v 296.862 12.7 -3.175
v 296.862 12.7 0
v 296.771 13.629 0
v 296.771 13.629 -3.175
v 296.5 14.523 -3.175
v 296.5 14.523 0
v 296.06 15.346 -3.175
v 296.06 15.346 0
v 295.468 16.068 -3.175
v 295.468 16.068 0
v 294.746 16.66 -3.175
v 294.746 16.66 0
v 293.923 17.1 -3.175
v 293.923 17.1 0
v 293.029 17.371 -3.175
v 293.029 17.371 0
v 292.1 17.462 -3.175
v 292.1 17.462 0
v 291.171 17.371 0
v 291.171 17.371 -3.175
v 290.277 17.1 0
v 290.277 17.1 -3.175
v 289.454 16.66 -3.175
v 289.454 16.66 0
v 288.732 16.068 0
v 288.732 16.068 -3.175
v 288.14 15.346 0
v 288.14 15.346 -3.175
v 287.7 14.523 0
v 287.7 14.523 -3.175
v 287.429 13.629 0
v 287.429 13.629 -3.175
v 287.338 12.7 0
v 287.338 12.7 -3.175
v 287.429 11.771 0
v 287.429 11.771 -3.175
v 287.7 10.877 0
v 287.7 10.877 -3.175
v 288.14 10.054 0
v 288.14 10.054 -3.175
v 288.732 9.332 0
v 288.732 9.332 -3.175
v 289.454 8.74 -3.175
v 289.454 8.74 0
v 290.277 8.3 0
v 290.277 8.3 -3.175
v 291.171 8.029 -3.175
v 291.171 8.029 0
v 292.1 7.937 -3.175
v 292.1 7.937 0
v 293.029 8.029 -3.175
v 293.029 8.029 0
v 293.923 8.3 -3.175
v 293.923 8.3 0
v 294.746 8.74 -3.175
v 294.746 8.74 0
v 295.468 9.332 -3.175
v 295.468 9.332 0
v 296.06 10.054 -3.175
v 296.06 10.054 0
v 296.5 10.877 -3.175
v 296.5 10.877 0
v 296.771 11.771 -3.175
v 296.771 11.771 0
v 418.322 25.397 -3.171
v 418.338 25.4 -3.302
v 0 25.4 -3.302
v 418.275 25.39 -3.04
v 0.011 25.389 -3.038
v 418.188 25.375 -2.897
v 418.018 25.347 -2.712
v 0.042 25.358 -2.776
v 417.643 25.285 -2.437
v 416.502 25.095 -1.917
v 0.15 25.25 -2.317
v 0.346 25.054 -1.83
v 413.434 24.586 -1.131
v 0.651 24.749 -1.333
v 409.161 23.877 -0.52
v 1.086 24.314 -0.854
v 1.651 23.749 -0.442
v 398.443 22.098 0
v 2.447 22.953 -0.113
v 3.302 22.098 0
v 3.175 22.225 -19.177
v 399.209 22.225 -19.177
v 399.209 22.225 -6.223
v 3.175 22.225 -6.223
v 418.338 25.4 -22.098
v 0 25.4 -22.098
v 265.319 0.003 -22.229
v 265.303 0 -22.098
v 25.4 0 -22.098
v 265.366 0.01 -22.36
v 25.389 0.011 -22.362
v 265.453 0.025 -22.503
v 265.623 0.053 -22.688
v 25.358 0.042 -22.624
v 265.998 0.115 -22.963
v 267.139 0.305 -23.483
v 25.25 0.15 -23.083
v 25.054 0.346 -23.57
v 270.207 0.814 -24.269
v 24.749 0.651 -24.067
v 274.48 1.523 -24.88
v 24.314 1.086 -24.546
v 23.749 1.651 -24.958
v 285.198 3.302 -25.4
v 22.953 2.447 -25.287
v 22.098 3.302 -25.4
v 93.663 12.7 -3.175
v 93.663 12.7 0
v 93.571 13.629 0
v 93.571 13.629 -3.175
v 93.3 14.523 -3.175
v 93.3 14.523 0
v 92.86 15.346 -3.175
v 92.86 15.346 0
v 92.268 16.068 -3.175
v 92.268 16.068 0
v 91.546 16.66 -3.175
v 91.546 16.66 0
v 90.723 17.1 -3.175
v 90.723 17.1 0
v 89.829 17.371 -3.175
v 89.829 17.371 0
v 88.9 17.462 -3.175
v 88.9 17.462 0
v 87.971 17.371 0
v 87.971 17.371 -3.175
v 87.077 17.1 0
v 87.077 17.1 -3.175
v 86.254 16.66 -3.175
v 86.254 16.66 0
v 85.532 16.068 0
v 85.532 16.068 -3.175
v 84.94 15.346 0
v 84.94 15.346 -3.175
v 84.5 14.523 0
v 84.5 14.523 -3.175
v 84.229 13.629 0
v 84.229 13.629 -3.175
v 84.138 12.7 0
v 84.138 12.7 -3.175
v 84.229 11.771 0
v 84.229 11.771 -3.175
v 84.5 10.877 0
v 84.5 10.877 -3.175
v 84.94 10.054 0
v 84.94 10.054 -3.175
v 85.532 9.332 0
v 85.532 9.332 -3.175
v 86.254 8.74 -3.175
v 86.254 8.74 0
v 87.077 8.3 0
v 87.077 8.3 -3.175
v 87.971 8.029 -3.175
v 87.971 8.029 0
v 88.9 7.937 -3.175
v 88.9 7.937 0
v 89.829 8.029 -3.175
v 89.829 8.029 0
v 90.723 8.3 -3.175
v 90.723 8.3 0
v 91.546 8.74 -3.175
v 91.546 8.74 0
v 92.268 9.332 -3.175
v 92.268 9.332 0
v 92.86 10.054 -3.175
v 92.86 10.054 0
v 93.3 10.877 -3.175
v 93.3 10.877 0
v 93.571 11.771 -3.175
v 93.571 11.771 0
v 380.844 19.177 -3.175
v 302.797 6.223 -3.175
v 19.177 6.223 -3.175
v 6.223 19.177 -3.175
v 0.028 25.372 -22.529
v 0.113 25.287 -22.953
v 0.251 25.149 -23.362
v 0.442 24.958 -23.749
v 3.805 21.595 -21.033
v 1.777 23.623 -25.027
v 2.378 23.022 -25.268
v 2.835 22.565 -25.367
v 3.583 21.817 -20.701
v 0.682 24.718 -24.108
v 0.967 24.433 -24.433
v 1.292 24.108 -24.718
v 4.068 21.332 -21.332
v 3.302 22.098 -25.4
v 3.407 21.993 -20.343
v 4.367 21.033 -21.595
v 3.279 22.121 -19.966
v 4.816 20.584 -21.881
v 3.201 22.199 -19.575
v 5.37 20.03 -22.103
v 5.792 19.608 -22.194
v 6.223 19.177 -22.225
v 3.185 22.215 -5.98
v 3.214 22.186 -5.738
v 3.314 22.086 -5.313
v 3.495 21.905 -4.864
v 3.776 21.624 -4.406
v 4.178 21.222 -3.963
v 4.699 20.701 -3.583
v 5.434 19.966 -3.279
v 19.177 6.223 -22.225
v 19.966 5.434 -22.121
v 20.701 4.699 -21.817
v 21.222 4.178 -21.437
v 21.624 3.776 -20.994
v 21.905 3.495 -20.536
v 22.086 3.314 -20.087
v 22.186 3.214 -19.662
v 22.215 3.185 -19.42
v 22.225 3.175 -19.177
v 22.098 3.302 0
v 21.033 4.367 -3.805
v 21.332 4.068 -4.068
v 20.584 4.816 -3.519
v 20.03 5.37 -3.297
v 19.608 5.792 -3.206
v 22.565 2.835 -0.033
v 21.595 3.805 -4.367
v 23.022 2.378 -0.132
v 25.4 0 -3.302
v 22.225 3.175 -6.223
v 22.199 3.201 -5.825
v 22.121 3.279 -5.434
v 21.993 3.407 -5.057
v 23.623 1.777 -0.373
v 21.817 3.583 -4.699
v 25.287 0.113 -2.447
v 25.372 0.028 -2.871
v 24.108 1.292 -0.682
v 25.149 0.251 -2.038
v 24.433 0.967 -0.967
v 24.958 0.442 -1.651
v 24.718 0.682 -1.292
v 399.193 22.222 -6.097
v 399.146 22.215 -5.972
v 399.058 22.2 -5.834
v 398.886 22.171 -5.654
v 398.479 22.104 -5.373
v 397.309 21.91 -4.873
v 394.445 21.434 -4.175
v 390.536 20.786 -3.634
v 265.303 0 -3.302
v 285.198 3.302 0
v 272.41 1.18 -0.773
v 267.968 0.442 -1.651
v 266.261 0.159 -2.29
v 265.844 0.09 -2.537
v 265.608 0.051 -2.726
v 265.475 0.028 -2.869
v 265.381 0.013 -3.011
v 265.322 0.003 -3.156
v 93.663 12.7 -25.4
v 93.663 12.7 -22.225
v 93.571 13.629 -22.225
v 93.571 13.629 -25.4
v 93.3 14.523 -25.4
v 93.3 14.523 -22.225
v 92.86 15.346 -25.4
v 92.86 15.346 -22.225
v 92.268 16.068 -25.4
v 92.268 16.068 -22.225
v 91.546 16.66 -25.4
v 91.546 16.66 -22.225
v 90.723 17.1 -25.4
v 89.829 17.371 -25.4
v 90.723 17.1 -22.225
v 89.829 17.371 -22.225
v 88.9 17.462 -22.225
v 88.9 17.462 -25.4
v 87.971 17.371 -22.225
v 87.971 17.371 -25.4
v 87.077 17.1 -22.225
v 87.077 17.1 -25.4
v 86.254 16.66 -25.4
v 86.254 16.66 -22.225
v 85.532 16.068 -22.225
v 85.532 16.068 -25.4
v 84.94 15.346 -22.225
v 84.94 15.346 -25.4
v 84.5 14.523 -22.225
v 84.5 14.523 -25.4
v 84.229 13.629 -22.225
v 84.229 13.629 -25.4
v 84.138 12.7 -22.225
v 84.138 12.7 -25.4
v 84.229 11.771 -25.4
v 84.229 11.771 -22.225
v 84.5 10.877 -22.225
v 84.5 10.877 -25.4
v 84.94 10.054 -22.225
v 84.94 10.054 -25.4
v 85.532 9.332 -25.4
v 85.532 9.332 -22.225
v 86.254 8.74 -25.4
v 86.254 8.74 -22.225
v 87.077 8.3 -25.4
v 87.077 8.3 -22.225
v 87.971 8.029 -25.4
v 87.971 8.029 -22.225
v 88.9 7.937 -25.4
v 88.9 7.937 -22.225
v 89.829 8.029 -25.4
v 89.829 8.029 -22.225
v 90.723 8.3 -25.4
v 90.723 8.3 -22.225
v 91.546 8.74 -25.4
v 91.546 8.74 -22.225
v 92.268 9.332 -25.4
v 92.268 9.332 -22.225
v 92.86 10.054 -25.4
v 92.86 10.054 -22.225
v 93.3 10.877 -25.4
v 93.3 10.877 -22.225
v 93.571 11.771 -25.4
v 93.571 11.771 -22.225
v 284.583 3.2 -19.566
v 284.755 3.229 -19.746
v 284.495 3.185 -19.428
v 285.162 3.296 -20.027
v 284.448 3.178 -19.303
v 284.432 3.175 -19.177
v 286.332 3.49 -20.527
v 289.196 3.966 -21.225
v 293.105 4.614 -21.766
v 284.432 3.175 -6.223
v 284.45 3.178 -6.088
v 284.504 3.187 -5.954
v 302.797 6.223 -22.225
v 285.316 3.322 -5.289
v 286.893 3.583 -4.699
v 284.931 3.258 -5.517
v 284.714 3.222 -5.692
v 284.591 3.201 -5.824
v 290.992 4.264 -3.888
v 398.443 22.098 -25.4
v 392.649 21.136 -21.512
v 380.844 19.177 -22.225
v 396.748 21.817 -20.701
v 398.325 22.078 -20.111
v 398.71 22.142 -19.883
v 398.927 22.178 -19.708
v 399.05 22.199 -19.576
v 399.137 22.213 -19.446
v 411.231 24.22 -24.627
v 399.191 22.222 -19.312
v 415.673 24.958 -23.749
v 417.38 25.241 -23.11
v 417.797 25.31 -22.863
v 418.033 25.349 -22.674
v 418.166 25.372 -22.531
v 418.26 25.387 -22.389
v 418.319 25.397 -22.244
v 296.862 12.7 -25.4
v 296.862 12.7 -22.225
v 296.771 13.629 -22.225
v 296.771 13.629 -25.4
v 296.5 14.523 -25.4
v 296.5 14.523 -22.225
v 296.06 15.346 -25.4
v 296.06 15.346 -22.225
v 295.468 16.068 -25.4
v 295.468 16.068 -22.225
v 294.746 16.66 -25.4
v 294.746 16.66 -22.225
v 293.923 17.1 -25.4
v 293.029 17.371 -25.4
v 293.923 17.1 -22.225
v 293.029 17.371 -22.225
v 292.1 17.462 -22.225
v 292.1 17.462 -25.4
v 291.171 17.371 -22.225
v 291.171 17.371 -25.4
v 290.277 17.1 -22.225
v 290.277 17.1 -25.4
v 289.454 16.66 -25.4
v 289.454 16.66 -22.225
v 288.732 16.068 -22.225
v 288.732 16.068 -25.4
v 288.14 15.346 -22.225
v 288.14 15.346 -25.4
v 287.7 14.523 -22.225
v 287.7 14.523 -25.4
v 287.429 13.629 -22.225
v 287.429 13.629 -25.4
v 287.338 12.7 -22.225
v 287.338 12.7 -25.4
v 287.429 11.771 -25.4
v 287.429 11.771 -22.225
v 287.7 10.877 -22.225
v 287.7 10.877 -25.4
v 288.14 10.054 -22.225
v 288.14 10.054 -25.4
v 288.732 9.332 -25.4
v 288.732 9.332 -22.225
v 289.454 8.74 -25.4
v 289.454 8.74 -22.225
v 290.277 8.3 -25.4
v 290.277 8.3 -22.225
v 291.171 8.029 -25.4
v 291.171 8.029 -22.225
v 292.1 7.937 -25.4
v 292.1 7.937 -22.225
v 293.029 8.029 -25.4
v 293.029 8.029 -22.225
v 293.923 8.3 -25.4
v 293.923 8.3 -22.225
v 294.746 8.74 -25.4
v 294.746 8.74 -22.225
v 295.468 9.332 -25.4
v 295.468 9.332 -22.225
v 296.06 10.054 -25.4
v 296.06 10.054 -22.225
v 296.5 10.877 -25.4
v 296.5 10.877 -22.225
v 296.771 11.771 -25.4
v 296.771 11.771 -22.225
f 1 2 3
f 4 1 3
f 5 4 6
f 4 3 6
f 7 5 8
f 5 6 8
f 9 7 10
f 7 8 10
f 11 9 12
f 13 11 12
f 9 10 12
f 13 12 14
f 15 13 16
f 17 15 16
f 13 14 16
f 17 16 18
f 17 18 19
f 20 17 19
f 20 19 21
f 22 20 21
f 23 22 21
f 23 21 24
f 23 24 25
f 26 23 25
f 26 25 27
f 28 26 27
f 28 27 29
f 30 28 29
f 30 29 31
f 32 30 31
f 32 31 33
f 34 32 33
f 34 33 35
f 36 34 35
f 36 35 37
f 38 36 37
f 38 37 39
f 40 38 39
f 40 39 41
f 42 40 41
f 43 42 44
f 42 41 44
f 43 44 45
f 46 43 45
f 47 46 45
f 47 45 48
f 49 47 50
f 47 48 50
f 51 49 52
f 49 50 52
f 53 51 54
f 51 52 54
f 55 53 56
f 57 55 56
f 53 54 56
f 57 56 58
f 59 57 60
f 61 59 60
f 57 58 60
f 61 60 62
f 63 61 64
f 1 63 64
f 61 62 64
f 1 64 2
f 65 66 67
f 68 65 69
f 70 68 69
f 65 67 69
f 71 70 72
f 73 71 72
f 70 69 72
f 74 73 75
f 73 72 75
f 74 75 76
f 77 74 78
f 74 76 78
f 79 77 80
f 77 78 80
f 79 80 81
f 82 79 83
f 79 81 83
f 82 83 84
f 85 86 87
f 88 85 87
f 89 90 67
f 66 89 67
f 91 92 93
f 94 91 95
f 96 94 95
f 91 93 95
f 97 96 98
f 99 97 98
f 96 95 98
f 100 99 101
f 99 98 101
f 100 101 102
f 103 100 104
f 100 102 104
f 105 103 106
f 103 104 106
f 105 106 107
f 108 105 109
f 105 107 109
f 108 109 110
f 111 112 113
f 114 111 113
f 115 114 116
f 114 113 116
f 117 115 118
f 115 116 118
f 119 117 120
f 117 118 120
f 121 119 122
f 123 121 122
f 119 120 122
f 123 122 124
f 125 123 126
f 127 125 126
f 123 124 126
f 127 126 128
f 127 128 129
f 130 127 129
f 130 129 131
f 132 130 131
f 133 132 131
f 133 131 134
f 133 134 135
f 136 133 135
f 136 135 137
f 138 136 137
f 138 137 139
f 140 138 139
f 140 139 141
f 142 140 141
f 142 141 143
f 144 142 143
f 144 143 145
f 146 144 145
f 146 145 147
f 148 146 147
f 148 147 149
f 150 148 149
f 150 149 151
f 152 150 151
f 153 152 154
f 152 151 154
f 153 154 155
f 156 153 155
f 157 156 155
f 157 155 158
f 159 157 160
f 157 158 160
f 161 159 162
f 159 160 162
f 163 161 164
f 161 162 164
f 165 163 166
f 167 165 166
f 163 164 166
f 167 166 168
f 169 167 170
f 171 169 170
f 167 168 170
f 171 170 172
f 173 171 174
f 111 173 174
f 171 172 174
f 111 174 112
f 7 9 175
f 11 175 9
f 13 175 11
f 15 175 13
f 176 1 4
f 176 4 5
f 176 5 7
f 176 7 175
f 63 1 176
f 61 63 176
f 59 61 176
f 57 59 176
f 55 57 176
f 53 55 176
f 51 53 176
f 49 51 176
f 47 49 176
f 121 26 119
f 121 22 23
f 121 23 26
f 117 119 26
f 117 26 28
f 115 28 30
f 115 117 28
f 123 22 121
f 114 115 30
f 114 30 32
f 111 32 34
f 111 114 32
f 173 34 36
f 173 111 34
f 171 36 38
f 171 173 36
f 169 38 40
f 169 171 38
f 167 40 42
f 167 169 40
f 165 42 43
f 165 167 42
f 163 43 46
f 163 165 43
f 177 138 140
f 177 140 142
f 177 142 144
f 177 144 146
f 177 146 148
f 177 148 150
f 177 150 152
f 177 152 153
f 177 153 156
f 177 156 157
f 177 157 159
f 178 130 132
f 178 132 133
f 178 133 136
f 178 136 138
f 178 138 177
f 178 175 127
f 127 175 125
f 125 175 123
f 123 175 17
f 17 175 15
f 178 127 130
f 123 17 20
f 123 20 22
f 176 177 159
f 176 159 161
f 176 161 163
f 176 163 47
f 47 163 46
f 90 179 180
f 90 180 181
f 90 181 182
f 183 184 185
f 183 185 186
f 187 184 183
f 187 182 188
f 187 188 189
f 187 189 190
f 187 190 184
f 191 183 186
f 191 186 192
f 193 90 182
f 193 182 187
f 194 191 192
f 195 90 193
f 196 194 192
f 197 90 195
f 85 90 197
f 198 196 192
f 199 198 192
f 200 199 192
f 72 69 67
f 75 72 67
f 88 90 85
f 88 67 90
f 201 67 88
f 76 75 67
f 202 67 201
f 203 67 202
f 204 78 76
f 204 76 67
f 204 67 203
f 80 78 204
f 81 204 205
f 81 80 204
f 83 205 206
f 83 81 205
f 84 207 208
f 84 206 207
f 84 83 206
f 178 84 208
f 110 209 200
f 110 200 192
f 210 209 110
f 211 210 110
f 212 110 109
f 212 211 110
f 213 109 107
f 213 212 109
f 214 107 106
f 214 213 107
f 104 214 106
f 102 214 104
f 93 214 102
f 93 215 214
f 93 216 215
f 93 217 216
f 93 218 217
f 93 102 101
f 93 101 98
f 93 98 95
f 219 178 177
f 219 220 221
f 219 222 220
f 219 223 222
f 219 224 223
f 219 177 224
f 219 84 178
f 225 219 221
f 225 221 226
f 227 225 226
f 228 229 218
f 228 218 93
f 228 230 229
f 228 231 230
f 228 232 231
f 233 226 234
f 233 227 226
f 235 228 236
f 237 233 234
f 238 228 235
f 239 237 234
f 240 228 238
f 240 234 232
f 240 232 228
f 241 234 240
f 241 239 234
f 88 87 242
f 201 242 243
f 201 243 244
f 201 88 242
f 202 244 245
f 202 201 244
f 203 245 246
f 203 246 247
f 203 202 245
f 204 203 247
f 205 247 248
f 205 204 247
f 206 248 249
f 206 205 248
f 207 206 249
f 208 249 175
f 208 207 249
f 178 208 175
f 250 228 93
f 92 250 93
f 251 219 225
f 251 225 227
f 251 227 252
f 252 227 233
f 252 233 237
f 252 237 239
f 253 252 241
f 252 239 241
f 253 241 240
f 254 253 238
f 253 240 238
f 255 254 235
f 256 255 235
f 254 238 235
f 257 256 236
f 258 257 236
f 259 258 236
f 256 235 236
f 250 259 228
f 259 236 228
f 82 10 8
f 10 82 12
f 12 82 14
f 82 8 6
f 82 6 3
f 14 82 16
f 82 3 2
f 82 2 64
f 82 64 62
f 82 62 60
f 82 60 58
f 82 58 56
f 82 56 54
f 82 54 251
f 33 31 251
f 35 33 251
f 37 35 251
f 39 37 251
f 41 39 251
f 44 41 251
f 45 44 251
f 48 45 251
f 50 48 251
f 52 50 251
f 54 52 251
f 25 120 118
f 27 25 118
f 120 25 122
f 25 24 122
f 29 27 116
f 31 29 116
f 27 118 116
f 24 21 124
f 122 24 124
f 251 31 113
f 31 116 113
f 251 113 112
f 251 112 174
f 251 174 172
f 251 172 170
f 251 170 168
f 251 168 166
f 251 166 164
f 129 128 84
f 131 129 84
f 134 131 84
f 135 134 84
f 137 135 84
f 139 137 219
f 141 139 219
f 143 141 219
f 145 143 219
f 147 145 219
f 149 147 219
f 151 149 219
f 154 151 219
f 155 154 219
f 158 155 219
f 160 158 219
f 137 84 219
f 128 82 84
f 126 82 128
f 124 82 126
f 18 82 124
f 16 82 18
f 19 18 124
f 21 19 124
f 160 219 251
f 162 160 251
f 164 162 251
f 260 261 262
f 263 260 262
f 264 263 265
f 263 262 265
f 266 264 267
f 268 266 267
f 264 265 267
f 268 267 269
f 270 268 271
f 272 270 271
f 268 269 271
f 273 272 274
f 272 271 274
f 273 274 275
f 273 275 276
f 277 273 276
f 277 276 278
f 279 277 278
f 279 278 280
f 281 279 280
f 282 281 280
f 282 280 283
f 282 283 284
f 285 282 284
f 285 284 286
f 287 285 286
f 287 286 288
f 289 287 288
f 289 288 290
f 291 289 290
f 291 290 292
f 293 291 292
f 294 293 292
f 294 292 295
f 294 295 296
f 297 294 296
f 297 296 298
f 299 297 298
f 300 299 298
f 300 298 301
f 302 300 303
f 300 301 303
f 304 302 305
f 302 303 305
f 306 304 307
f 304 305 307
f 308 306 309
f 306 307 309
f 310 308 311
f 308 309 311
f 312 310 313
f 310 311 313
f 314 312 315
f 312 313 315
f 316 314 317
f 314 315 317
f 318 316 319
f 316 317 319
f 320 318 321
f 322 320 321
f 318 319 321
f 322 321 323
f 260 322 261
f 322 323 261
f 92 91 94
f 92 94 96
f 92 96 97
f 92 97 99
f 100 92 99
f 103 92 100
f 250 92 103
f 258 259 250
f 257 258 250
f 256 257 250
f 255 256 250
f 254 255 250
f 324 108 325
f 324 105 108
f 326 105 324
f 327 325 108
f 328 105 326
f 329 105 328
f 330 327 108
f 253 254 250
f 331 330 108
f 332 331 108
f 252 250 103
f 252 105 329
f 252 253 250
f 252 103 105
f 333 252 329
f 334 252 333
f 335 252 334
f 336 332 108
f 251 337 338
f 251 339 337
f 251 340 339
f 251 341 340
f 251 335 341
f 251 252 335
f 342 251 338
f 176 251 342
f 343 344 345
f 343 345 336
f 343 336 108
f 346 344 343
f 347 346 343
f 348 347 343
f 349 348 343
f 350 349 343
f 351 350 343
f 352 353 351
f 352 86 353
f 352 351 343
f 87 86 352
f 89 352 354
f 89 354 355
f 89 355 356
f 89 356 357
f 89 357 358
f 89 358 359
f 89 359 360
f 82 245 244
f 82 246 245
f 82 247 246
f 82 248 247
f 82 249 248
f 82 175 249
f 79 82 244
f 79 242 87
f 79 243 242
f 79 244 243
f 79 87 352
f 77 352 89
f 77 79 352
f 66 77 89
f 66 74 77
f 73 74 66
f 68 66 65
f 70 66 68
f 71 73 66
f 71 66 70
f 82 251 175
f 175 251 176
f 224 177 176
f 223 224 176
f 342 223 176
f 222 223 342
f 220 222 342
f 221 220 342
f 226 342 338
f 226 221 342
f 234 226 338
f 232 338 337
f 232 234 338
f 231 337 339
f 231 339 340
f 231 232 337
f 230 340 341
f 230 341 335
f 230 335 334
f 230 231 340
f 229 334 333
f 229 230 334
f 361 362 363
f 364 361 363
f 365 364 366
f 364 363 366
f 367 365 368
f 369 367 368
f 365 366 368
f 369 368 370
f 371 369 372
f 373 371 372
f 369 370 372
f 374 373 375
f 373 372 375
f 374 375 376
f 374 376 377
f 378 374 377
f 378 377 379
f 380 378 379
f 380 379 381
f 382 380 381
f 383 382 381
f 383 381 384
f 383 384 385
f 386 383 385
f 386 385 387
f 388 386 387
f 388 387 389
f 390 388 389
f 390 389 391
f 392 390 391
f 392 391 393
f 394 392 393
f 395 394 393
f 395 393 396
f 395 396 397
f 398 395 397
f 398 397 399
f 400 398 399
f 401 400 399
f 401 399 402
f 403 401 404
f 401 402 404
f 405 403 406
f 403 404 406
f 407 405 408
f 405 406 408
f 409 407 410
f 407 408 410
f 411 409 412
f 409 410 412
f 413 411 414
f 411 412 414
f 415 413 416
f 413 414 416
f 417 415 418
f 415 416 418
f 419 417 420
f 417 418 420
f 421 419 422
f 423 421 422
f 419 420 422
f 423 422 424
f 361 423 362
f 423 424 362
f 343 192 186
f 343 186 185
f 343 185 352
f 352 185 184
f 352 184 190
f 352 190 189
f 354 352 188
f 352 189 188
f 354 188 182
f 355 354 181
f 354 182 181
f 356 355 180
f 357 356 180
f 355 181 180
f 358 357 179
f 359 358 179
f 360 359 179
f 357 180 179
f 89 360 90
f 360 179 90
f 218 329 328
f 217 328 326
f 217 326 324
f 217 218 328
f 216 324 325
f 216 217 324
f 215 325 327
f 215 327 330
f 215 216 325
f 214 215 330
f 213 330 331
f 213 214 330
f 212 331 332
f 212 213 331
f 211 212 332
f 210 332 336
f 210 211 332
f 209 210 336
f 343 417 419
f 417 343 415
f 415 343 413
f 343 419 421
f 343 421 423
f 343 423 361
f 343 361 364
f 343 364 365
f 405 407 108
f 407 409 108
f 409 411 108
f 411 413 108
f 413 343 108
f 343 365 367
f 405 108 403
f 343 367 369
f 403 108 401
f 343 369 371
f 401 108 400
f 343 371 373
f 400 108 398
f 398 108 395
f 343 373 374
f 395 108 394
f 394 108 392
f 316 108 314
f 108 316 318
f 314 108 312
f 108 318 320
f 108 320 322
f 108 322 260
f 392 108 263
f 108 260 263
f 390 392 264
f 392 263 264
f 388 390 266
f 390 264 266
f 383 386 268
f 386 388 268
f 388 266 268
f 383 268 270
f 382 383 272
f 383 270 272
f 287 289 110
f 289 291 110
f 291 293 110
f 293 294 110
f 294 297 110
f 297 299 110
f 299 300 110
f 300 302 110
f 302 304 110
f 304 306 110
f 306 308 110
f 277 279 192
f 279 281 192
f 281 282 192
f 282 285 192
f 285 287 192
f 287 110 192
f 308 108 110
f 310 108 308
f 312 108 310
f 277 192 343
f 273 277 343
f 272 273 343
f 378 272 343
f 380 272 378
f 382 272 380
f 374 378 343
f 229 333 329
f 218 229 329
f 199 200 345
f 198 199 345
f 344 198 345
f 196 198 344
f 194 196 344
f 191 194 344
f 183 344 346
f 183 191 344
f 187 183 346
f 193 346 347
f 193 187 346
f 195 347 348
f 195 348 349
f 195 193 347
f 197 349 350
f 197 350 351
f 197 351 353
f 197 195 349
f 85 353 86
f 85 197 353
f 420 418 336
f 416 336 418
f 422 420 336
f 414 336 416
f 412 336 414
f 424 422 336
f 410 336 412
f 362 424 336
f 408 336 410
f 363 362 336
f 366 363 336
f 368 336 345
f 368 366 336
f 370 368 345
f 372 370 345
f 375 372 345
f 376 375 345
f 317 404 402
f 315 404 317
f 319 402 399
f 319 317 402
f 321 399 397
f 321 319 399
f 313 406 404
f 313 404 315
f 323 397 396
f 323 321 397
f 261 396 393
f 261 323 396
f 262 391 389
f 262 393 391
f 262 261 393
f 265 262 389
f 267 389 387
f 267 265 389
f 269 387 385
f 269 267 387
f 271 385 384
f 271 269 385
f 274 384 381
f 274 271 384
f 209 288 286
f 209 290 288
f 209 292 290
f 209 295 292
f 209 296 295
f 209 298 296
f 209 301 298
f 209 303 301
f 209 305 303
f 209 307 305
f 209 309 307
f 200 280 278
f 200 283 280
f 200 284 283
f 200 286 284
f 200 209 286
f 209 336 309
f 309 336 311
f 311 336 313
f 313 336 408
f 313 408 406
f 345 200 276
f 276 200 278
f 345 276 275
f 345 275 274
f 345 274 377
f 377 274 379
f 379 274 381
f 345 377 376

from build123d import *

# Parameters (mm, degrees)
BOSS_EXTRUDE1_DEPTH = 418.338
SKETCH2_R           = 4.7625
CUT_EXTRUDE1_DEPTH  = 420.87736572


with BuildPart() as part:
    # Sketch1 → Boss-Extrude1 (new body)
    with BuildSketch(Plane(origin=(0, 0, 0), x_dir=(0, 0, -1), z_dir=(1, 0, 0))):
        with BuildLine():
            Line((3.302, 0), (22.098, 0))
            ThreePointArc((22.098, 0), (24.432866591, 0.967133409), (25.4, 3.302))
            Line((25.4, 3.302), (25.4, 22.098))
            ThreePointArc((25.4, 22.098), (24.432866591, 24.432866591), (22.098, 25.4))
            Line((22.098, 25.4), (3.302, 25.4))
            ThreePointArc((3.302, 25.4), (0.967133409, 24.432866591), (0, 22.098))
            Line((0, 22.098), (0, 3.302))
            ThreePointArc((0, 3.302), (0.967133409, 0.967133409), (3.302, 0))
        make_face()
        with BuildLine():
            Line((6.223, 3.175), (19.177, 3.175))
            ThreePointArc((19.177, 3.175), (21.332261469, 4.067738531), (22.225, 6.223))
            Line((22.225, 6.223), (22.225, 19.177))
            ThreePointArc((22.225, 19.177), (21.332261469, 21.332261469), (19.177, 22.225))
            Line((19.177, 22.225), (6.223, 22.225))
            ThreePointArc((6.223, 22.225), (4.067738531, 21.332261469), (3.175, 19.177))
            Line((3.175, 19.177), (3.175, 6.223))
            ThreePointArc((3.175, 6.223), (4.067738531, 4.067738531), (6.223, 3.175))
        make_face(mode=Mode.SUBTRACT)
    extrude(amount=BOSS_EXTRUDE1_DEPTH)

    # Sketch2 → Cut-Extrude1 (cut, through all)
    with BuildSketch(Plane.XY):
        with Locations((88.9, 12.7)):
            Circle(SKETCH2_R)
        with Locations((292.1, 12.7)):
            Circle(SKETCH2_R)
        Polygon((0, 0), (0, 25.4), (25.4, 0), align=None)
        Polygon((418.338, 0), (265.303, 0), (418.338, 25.4), align=None)
    extrude(amount=-CUT_EXTRUDE1_DEPTH, mode=Mode.SUBTRACT)


solid = part.part
